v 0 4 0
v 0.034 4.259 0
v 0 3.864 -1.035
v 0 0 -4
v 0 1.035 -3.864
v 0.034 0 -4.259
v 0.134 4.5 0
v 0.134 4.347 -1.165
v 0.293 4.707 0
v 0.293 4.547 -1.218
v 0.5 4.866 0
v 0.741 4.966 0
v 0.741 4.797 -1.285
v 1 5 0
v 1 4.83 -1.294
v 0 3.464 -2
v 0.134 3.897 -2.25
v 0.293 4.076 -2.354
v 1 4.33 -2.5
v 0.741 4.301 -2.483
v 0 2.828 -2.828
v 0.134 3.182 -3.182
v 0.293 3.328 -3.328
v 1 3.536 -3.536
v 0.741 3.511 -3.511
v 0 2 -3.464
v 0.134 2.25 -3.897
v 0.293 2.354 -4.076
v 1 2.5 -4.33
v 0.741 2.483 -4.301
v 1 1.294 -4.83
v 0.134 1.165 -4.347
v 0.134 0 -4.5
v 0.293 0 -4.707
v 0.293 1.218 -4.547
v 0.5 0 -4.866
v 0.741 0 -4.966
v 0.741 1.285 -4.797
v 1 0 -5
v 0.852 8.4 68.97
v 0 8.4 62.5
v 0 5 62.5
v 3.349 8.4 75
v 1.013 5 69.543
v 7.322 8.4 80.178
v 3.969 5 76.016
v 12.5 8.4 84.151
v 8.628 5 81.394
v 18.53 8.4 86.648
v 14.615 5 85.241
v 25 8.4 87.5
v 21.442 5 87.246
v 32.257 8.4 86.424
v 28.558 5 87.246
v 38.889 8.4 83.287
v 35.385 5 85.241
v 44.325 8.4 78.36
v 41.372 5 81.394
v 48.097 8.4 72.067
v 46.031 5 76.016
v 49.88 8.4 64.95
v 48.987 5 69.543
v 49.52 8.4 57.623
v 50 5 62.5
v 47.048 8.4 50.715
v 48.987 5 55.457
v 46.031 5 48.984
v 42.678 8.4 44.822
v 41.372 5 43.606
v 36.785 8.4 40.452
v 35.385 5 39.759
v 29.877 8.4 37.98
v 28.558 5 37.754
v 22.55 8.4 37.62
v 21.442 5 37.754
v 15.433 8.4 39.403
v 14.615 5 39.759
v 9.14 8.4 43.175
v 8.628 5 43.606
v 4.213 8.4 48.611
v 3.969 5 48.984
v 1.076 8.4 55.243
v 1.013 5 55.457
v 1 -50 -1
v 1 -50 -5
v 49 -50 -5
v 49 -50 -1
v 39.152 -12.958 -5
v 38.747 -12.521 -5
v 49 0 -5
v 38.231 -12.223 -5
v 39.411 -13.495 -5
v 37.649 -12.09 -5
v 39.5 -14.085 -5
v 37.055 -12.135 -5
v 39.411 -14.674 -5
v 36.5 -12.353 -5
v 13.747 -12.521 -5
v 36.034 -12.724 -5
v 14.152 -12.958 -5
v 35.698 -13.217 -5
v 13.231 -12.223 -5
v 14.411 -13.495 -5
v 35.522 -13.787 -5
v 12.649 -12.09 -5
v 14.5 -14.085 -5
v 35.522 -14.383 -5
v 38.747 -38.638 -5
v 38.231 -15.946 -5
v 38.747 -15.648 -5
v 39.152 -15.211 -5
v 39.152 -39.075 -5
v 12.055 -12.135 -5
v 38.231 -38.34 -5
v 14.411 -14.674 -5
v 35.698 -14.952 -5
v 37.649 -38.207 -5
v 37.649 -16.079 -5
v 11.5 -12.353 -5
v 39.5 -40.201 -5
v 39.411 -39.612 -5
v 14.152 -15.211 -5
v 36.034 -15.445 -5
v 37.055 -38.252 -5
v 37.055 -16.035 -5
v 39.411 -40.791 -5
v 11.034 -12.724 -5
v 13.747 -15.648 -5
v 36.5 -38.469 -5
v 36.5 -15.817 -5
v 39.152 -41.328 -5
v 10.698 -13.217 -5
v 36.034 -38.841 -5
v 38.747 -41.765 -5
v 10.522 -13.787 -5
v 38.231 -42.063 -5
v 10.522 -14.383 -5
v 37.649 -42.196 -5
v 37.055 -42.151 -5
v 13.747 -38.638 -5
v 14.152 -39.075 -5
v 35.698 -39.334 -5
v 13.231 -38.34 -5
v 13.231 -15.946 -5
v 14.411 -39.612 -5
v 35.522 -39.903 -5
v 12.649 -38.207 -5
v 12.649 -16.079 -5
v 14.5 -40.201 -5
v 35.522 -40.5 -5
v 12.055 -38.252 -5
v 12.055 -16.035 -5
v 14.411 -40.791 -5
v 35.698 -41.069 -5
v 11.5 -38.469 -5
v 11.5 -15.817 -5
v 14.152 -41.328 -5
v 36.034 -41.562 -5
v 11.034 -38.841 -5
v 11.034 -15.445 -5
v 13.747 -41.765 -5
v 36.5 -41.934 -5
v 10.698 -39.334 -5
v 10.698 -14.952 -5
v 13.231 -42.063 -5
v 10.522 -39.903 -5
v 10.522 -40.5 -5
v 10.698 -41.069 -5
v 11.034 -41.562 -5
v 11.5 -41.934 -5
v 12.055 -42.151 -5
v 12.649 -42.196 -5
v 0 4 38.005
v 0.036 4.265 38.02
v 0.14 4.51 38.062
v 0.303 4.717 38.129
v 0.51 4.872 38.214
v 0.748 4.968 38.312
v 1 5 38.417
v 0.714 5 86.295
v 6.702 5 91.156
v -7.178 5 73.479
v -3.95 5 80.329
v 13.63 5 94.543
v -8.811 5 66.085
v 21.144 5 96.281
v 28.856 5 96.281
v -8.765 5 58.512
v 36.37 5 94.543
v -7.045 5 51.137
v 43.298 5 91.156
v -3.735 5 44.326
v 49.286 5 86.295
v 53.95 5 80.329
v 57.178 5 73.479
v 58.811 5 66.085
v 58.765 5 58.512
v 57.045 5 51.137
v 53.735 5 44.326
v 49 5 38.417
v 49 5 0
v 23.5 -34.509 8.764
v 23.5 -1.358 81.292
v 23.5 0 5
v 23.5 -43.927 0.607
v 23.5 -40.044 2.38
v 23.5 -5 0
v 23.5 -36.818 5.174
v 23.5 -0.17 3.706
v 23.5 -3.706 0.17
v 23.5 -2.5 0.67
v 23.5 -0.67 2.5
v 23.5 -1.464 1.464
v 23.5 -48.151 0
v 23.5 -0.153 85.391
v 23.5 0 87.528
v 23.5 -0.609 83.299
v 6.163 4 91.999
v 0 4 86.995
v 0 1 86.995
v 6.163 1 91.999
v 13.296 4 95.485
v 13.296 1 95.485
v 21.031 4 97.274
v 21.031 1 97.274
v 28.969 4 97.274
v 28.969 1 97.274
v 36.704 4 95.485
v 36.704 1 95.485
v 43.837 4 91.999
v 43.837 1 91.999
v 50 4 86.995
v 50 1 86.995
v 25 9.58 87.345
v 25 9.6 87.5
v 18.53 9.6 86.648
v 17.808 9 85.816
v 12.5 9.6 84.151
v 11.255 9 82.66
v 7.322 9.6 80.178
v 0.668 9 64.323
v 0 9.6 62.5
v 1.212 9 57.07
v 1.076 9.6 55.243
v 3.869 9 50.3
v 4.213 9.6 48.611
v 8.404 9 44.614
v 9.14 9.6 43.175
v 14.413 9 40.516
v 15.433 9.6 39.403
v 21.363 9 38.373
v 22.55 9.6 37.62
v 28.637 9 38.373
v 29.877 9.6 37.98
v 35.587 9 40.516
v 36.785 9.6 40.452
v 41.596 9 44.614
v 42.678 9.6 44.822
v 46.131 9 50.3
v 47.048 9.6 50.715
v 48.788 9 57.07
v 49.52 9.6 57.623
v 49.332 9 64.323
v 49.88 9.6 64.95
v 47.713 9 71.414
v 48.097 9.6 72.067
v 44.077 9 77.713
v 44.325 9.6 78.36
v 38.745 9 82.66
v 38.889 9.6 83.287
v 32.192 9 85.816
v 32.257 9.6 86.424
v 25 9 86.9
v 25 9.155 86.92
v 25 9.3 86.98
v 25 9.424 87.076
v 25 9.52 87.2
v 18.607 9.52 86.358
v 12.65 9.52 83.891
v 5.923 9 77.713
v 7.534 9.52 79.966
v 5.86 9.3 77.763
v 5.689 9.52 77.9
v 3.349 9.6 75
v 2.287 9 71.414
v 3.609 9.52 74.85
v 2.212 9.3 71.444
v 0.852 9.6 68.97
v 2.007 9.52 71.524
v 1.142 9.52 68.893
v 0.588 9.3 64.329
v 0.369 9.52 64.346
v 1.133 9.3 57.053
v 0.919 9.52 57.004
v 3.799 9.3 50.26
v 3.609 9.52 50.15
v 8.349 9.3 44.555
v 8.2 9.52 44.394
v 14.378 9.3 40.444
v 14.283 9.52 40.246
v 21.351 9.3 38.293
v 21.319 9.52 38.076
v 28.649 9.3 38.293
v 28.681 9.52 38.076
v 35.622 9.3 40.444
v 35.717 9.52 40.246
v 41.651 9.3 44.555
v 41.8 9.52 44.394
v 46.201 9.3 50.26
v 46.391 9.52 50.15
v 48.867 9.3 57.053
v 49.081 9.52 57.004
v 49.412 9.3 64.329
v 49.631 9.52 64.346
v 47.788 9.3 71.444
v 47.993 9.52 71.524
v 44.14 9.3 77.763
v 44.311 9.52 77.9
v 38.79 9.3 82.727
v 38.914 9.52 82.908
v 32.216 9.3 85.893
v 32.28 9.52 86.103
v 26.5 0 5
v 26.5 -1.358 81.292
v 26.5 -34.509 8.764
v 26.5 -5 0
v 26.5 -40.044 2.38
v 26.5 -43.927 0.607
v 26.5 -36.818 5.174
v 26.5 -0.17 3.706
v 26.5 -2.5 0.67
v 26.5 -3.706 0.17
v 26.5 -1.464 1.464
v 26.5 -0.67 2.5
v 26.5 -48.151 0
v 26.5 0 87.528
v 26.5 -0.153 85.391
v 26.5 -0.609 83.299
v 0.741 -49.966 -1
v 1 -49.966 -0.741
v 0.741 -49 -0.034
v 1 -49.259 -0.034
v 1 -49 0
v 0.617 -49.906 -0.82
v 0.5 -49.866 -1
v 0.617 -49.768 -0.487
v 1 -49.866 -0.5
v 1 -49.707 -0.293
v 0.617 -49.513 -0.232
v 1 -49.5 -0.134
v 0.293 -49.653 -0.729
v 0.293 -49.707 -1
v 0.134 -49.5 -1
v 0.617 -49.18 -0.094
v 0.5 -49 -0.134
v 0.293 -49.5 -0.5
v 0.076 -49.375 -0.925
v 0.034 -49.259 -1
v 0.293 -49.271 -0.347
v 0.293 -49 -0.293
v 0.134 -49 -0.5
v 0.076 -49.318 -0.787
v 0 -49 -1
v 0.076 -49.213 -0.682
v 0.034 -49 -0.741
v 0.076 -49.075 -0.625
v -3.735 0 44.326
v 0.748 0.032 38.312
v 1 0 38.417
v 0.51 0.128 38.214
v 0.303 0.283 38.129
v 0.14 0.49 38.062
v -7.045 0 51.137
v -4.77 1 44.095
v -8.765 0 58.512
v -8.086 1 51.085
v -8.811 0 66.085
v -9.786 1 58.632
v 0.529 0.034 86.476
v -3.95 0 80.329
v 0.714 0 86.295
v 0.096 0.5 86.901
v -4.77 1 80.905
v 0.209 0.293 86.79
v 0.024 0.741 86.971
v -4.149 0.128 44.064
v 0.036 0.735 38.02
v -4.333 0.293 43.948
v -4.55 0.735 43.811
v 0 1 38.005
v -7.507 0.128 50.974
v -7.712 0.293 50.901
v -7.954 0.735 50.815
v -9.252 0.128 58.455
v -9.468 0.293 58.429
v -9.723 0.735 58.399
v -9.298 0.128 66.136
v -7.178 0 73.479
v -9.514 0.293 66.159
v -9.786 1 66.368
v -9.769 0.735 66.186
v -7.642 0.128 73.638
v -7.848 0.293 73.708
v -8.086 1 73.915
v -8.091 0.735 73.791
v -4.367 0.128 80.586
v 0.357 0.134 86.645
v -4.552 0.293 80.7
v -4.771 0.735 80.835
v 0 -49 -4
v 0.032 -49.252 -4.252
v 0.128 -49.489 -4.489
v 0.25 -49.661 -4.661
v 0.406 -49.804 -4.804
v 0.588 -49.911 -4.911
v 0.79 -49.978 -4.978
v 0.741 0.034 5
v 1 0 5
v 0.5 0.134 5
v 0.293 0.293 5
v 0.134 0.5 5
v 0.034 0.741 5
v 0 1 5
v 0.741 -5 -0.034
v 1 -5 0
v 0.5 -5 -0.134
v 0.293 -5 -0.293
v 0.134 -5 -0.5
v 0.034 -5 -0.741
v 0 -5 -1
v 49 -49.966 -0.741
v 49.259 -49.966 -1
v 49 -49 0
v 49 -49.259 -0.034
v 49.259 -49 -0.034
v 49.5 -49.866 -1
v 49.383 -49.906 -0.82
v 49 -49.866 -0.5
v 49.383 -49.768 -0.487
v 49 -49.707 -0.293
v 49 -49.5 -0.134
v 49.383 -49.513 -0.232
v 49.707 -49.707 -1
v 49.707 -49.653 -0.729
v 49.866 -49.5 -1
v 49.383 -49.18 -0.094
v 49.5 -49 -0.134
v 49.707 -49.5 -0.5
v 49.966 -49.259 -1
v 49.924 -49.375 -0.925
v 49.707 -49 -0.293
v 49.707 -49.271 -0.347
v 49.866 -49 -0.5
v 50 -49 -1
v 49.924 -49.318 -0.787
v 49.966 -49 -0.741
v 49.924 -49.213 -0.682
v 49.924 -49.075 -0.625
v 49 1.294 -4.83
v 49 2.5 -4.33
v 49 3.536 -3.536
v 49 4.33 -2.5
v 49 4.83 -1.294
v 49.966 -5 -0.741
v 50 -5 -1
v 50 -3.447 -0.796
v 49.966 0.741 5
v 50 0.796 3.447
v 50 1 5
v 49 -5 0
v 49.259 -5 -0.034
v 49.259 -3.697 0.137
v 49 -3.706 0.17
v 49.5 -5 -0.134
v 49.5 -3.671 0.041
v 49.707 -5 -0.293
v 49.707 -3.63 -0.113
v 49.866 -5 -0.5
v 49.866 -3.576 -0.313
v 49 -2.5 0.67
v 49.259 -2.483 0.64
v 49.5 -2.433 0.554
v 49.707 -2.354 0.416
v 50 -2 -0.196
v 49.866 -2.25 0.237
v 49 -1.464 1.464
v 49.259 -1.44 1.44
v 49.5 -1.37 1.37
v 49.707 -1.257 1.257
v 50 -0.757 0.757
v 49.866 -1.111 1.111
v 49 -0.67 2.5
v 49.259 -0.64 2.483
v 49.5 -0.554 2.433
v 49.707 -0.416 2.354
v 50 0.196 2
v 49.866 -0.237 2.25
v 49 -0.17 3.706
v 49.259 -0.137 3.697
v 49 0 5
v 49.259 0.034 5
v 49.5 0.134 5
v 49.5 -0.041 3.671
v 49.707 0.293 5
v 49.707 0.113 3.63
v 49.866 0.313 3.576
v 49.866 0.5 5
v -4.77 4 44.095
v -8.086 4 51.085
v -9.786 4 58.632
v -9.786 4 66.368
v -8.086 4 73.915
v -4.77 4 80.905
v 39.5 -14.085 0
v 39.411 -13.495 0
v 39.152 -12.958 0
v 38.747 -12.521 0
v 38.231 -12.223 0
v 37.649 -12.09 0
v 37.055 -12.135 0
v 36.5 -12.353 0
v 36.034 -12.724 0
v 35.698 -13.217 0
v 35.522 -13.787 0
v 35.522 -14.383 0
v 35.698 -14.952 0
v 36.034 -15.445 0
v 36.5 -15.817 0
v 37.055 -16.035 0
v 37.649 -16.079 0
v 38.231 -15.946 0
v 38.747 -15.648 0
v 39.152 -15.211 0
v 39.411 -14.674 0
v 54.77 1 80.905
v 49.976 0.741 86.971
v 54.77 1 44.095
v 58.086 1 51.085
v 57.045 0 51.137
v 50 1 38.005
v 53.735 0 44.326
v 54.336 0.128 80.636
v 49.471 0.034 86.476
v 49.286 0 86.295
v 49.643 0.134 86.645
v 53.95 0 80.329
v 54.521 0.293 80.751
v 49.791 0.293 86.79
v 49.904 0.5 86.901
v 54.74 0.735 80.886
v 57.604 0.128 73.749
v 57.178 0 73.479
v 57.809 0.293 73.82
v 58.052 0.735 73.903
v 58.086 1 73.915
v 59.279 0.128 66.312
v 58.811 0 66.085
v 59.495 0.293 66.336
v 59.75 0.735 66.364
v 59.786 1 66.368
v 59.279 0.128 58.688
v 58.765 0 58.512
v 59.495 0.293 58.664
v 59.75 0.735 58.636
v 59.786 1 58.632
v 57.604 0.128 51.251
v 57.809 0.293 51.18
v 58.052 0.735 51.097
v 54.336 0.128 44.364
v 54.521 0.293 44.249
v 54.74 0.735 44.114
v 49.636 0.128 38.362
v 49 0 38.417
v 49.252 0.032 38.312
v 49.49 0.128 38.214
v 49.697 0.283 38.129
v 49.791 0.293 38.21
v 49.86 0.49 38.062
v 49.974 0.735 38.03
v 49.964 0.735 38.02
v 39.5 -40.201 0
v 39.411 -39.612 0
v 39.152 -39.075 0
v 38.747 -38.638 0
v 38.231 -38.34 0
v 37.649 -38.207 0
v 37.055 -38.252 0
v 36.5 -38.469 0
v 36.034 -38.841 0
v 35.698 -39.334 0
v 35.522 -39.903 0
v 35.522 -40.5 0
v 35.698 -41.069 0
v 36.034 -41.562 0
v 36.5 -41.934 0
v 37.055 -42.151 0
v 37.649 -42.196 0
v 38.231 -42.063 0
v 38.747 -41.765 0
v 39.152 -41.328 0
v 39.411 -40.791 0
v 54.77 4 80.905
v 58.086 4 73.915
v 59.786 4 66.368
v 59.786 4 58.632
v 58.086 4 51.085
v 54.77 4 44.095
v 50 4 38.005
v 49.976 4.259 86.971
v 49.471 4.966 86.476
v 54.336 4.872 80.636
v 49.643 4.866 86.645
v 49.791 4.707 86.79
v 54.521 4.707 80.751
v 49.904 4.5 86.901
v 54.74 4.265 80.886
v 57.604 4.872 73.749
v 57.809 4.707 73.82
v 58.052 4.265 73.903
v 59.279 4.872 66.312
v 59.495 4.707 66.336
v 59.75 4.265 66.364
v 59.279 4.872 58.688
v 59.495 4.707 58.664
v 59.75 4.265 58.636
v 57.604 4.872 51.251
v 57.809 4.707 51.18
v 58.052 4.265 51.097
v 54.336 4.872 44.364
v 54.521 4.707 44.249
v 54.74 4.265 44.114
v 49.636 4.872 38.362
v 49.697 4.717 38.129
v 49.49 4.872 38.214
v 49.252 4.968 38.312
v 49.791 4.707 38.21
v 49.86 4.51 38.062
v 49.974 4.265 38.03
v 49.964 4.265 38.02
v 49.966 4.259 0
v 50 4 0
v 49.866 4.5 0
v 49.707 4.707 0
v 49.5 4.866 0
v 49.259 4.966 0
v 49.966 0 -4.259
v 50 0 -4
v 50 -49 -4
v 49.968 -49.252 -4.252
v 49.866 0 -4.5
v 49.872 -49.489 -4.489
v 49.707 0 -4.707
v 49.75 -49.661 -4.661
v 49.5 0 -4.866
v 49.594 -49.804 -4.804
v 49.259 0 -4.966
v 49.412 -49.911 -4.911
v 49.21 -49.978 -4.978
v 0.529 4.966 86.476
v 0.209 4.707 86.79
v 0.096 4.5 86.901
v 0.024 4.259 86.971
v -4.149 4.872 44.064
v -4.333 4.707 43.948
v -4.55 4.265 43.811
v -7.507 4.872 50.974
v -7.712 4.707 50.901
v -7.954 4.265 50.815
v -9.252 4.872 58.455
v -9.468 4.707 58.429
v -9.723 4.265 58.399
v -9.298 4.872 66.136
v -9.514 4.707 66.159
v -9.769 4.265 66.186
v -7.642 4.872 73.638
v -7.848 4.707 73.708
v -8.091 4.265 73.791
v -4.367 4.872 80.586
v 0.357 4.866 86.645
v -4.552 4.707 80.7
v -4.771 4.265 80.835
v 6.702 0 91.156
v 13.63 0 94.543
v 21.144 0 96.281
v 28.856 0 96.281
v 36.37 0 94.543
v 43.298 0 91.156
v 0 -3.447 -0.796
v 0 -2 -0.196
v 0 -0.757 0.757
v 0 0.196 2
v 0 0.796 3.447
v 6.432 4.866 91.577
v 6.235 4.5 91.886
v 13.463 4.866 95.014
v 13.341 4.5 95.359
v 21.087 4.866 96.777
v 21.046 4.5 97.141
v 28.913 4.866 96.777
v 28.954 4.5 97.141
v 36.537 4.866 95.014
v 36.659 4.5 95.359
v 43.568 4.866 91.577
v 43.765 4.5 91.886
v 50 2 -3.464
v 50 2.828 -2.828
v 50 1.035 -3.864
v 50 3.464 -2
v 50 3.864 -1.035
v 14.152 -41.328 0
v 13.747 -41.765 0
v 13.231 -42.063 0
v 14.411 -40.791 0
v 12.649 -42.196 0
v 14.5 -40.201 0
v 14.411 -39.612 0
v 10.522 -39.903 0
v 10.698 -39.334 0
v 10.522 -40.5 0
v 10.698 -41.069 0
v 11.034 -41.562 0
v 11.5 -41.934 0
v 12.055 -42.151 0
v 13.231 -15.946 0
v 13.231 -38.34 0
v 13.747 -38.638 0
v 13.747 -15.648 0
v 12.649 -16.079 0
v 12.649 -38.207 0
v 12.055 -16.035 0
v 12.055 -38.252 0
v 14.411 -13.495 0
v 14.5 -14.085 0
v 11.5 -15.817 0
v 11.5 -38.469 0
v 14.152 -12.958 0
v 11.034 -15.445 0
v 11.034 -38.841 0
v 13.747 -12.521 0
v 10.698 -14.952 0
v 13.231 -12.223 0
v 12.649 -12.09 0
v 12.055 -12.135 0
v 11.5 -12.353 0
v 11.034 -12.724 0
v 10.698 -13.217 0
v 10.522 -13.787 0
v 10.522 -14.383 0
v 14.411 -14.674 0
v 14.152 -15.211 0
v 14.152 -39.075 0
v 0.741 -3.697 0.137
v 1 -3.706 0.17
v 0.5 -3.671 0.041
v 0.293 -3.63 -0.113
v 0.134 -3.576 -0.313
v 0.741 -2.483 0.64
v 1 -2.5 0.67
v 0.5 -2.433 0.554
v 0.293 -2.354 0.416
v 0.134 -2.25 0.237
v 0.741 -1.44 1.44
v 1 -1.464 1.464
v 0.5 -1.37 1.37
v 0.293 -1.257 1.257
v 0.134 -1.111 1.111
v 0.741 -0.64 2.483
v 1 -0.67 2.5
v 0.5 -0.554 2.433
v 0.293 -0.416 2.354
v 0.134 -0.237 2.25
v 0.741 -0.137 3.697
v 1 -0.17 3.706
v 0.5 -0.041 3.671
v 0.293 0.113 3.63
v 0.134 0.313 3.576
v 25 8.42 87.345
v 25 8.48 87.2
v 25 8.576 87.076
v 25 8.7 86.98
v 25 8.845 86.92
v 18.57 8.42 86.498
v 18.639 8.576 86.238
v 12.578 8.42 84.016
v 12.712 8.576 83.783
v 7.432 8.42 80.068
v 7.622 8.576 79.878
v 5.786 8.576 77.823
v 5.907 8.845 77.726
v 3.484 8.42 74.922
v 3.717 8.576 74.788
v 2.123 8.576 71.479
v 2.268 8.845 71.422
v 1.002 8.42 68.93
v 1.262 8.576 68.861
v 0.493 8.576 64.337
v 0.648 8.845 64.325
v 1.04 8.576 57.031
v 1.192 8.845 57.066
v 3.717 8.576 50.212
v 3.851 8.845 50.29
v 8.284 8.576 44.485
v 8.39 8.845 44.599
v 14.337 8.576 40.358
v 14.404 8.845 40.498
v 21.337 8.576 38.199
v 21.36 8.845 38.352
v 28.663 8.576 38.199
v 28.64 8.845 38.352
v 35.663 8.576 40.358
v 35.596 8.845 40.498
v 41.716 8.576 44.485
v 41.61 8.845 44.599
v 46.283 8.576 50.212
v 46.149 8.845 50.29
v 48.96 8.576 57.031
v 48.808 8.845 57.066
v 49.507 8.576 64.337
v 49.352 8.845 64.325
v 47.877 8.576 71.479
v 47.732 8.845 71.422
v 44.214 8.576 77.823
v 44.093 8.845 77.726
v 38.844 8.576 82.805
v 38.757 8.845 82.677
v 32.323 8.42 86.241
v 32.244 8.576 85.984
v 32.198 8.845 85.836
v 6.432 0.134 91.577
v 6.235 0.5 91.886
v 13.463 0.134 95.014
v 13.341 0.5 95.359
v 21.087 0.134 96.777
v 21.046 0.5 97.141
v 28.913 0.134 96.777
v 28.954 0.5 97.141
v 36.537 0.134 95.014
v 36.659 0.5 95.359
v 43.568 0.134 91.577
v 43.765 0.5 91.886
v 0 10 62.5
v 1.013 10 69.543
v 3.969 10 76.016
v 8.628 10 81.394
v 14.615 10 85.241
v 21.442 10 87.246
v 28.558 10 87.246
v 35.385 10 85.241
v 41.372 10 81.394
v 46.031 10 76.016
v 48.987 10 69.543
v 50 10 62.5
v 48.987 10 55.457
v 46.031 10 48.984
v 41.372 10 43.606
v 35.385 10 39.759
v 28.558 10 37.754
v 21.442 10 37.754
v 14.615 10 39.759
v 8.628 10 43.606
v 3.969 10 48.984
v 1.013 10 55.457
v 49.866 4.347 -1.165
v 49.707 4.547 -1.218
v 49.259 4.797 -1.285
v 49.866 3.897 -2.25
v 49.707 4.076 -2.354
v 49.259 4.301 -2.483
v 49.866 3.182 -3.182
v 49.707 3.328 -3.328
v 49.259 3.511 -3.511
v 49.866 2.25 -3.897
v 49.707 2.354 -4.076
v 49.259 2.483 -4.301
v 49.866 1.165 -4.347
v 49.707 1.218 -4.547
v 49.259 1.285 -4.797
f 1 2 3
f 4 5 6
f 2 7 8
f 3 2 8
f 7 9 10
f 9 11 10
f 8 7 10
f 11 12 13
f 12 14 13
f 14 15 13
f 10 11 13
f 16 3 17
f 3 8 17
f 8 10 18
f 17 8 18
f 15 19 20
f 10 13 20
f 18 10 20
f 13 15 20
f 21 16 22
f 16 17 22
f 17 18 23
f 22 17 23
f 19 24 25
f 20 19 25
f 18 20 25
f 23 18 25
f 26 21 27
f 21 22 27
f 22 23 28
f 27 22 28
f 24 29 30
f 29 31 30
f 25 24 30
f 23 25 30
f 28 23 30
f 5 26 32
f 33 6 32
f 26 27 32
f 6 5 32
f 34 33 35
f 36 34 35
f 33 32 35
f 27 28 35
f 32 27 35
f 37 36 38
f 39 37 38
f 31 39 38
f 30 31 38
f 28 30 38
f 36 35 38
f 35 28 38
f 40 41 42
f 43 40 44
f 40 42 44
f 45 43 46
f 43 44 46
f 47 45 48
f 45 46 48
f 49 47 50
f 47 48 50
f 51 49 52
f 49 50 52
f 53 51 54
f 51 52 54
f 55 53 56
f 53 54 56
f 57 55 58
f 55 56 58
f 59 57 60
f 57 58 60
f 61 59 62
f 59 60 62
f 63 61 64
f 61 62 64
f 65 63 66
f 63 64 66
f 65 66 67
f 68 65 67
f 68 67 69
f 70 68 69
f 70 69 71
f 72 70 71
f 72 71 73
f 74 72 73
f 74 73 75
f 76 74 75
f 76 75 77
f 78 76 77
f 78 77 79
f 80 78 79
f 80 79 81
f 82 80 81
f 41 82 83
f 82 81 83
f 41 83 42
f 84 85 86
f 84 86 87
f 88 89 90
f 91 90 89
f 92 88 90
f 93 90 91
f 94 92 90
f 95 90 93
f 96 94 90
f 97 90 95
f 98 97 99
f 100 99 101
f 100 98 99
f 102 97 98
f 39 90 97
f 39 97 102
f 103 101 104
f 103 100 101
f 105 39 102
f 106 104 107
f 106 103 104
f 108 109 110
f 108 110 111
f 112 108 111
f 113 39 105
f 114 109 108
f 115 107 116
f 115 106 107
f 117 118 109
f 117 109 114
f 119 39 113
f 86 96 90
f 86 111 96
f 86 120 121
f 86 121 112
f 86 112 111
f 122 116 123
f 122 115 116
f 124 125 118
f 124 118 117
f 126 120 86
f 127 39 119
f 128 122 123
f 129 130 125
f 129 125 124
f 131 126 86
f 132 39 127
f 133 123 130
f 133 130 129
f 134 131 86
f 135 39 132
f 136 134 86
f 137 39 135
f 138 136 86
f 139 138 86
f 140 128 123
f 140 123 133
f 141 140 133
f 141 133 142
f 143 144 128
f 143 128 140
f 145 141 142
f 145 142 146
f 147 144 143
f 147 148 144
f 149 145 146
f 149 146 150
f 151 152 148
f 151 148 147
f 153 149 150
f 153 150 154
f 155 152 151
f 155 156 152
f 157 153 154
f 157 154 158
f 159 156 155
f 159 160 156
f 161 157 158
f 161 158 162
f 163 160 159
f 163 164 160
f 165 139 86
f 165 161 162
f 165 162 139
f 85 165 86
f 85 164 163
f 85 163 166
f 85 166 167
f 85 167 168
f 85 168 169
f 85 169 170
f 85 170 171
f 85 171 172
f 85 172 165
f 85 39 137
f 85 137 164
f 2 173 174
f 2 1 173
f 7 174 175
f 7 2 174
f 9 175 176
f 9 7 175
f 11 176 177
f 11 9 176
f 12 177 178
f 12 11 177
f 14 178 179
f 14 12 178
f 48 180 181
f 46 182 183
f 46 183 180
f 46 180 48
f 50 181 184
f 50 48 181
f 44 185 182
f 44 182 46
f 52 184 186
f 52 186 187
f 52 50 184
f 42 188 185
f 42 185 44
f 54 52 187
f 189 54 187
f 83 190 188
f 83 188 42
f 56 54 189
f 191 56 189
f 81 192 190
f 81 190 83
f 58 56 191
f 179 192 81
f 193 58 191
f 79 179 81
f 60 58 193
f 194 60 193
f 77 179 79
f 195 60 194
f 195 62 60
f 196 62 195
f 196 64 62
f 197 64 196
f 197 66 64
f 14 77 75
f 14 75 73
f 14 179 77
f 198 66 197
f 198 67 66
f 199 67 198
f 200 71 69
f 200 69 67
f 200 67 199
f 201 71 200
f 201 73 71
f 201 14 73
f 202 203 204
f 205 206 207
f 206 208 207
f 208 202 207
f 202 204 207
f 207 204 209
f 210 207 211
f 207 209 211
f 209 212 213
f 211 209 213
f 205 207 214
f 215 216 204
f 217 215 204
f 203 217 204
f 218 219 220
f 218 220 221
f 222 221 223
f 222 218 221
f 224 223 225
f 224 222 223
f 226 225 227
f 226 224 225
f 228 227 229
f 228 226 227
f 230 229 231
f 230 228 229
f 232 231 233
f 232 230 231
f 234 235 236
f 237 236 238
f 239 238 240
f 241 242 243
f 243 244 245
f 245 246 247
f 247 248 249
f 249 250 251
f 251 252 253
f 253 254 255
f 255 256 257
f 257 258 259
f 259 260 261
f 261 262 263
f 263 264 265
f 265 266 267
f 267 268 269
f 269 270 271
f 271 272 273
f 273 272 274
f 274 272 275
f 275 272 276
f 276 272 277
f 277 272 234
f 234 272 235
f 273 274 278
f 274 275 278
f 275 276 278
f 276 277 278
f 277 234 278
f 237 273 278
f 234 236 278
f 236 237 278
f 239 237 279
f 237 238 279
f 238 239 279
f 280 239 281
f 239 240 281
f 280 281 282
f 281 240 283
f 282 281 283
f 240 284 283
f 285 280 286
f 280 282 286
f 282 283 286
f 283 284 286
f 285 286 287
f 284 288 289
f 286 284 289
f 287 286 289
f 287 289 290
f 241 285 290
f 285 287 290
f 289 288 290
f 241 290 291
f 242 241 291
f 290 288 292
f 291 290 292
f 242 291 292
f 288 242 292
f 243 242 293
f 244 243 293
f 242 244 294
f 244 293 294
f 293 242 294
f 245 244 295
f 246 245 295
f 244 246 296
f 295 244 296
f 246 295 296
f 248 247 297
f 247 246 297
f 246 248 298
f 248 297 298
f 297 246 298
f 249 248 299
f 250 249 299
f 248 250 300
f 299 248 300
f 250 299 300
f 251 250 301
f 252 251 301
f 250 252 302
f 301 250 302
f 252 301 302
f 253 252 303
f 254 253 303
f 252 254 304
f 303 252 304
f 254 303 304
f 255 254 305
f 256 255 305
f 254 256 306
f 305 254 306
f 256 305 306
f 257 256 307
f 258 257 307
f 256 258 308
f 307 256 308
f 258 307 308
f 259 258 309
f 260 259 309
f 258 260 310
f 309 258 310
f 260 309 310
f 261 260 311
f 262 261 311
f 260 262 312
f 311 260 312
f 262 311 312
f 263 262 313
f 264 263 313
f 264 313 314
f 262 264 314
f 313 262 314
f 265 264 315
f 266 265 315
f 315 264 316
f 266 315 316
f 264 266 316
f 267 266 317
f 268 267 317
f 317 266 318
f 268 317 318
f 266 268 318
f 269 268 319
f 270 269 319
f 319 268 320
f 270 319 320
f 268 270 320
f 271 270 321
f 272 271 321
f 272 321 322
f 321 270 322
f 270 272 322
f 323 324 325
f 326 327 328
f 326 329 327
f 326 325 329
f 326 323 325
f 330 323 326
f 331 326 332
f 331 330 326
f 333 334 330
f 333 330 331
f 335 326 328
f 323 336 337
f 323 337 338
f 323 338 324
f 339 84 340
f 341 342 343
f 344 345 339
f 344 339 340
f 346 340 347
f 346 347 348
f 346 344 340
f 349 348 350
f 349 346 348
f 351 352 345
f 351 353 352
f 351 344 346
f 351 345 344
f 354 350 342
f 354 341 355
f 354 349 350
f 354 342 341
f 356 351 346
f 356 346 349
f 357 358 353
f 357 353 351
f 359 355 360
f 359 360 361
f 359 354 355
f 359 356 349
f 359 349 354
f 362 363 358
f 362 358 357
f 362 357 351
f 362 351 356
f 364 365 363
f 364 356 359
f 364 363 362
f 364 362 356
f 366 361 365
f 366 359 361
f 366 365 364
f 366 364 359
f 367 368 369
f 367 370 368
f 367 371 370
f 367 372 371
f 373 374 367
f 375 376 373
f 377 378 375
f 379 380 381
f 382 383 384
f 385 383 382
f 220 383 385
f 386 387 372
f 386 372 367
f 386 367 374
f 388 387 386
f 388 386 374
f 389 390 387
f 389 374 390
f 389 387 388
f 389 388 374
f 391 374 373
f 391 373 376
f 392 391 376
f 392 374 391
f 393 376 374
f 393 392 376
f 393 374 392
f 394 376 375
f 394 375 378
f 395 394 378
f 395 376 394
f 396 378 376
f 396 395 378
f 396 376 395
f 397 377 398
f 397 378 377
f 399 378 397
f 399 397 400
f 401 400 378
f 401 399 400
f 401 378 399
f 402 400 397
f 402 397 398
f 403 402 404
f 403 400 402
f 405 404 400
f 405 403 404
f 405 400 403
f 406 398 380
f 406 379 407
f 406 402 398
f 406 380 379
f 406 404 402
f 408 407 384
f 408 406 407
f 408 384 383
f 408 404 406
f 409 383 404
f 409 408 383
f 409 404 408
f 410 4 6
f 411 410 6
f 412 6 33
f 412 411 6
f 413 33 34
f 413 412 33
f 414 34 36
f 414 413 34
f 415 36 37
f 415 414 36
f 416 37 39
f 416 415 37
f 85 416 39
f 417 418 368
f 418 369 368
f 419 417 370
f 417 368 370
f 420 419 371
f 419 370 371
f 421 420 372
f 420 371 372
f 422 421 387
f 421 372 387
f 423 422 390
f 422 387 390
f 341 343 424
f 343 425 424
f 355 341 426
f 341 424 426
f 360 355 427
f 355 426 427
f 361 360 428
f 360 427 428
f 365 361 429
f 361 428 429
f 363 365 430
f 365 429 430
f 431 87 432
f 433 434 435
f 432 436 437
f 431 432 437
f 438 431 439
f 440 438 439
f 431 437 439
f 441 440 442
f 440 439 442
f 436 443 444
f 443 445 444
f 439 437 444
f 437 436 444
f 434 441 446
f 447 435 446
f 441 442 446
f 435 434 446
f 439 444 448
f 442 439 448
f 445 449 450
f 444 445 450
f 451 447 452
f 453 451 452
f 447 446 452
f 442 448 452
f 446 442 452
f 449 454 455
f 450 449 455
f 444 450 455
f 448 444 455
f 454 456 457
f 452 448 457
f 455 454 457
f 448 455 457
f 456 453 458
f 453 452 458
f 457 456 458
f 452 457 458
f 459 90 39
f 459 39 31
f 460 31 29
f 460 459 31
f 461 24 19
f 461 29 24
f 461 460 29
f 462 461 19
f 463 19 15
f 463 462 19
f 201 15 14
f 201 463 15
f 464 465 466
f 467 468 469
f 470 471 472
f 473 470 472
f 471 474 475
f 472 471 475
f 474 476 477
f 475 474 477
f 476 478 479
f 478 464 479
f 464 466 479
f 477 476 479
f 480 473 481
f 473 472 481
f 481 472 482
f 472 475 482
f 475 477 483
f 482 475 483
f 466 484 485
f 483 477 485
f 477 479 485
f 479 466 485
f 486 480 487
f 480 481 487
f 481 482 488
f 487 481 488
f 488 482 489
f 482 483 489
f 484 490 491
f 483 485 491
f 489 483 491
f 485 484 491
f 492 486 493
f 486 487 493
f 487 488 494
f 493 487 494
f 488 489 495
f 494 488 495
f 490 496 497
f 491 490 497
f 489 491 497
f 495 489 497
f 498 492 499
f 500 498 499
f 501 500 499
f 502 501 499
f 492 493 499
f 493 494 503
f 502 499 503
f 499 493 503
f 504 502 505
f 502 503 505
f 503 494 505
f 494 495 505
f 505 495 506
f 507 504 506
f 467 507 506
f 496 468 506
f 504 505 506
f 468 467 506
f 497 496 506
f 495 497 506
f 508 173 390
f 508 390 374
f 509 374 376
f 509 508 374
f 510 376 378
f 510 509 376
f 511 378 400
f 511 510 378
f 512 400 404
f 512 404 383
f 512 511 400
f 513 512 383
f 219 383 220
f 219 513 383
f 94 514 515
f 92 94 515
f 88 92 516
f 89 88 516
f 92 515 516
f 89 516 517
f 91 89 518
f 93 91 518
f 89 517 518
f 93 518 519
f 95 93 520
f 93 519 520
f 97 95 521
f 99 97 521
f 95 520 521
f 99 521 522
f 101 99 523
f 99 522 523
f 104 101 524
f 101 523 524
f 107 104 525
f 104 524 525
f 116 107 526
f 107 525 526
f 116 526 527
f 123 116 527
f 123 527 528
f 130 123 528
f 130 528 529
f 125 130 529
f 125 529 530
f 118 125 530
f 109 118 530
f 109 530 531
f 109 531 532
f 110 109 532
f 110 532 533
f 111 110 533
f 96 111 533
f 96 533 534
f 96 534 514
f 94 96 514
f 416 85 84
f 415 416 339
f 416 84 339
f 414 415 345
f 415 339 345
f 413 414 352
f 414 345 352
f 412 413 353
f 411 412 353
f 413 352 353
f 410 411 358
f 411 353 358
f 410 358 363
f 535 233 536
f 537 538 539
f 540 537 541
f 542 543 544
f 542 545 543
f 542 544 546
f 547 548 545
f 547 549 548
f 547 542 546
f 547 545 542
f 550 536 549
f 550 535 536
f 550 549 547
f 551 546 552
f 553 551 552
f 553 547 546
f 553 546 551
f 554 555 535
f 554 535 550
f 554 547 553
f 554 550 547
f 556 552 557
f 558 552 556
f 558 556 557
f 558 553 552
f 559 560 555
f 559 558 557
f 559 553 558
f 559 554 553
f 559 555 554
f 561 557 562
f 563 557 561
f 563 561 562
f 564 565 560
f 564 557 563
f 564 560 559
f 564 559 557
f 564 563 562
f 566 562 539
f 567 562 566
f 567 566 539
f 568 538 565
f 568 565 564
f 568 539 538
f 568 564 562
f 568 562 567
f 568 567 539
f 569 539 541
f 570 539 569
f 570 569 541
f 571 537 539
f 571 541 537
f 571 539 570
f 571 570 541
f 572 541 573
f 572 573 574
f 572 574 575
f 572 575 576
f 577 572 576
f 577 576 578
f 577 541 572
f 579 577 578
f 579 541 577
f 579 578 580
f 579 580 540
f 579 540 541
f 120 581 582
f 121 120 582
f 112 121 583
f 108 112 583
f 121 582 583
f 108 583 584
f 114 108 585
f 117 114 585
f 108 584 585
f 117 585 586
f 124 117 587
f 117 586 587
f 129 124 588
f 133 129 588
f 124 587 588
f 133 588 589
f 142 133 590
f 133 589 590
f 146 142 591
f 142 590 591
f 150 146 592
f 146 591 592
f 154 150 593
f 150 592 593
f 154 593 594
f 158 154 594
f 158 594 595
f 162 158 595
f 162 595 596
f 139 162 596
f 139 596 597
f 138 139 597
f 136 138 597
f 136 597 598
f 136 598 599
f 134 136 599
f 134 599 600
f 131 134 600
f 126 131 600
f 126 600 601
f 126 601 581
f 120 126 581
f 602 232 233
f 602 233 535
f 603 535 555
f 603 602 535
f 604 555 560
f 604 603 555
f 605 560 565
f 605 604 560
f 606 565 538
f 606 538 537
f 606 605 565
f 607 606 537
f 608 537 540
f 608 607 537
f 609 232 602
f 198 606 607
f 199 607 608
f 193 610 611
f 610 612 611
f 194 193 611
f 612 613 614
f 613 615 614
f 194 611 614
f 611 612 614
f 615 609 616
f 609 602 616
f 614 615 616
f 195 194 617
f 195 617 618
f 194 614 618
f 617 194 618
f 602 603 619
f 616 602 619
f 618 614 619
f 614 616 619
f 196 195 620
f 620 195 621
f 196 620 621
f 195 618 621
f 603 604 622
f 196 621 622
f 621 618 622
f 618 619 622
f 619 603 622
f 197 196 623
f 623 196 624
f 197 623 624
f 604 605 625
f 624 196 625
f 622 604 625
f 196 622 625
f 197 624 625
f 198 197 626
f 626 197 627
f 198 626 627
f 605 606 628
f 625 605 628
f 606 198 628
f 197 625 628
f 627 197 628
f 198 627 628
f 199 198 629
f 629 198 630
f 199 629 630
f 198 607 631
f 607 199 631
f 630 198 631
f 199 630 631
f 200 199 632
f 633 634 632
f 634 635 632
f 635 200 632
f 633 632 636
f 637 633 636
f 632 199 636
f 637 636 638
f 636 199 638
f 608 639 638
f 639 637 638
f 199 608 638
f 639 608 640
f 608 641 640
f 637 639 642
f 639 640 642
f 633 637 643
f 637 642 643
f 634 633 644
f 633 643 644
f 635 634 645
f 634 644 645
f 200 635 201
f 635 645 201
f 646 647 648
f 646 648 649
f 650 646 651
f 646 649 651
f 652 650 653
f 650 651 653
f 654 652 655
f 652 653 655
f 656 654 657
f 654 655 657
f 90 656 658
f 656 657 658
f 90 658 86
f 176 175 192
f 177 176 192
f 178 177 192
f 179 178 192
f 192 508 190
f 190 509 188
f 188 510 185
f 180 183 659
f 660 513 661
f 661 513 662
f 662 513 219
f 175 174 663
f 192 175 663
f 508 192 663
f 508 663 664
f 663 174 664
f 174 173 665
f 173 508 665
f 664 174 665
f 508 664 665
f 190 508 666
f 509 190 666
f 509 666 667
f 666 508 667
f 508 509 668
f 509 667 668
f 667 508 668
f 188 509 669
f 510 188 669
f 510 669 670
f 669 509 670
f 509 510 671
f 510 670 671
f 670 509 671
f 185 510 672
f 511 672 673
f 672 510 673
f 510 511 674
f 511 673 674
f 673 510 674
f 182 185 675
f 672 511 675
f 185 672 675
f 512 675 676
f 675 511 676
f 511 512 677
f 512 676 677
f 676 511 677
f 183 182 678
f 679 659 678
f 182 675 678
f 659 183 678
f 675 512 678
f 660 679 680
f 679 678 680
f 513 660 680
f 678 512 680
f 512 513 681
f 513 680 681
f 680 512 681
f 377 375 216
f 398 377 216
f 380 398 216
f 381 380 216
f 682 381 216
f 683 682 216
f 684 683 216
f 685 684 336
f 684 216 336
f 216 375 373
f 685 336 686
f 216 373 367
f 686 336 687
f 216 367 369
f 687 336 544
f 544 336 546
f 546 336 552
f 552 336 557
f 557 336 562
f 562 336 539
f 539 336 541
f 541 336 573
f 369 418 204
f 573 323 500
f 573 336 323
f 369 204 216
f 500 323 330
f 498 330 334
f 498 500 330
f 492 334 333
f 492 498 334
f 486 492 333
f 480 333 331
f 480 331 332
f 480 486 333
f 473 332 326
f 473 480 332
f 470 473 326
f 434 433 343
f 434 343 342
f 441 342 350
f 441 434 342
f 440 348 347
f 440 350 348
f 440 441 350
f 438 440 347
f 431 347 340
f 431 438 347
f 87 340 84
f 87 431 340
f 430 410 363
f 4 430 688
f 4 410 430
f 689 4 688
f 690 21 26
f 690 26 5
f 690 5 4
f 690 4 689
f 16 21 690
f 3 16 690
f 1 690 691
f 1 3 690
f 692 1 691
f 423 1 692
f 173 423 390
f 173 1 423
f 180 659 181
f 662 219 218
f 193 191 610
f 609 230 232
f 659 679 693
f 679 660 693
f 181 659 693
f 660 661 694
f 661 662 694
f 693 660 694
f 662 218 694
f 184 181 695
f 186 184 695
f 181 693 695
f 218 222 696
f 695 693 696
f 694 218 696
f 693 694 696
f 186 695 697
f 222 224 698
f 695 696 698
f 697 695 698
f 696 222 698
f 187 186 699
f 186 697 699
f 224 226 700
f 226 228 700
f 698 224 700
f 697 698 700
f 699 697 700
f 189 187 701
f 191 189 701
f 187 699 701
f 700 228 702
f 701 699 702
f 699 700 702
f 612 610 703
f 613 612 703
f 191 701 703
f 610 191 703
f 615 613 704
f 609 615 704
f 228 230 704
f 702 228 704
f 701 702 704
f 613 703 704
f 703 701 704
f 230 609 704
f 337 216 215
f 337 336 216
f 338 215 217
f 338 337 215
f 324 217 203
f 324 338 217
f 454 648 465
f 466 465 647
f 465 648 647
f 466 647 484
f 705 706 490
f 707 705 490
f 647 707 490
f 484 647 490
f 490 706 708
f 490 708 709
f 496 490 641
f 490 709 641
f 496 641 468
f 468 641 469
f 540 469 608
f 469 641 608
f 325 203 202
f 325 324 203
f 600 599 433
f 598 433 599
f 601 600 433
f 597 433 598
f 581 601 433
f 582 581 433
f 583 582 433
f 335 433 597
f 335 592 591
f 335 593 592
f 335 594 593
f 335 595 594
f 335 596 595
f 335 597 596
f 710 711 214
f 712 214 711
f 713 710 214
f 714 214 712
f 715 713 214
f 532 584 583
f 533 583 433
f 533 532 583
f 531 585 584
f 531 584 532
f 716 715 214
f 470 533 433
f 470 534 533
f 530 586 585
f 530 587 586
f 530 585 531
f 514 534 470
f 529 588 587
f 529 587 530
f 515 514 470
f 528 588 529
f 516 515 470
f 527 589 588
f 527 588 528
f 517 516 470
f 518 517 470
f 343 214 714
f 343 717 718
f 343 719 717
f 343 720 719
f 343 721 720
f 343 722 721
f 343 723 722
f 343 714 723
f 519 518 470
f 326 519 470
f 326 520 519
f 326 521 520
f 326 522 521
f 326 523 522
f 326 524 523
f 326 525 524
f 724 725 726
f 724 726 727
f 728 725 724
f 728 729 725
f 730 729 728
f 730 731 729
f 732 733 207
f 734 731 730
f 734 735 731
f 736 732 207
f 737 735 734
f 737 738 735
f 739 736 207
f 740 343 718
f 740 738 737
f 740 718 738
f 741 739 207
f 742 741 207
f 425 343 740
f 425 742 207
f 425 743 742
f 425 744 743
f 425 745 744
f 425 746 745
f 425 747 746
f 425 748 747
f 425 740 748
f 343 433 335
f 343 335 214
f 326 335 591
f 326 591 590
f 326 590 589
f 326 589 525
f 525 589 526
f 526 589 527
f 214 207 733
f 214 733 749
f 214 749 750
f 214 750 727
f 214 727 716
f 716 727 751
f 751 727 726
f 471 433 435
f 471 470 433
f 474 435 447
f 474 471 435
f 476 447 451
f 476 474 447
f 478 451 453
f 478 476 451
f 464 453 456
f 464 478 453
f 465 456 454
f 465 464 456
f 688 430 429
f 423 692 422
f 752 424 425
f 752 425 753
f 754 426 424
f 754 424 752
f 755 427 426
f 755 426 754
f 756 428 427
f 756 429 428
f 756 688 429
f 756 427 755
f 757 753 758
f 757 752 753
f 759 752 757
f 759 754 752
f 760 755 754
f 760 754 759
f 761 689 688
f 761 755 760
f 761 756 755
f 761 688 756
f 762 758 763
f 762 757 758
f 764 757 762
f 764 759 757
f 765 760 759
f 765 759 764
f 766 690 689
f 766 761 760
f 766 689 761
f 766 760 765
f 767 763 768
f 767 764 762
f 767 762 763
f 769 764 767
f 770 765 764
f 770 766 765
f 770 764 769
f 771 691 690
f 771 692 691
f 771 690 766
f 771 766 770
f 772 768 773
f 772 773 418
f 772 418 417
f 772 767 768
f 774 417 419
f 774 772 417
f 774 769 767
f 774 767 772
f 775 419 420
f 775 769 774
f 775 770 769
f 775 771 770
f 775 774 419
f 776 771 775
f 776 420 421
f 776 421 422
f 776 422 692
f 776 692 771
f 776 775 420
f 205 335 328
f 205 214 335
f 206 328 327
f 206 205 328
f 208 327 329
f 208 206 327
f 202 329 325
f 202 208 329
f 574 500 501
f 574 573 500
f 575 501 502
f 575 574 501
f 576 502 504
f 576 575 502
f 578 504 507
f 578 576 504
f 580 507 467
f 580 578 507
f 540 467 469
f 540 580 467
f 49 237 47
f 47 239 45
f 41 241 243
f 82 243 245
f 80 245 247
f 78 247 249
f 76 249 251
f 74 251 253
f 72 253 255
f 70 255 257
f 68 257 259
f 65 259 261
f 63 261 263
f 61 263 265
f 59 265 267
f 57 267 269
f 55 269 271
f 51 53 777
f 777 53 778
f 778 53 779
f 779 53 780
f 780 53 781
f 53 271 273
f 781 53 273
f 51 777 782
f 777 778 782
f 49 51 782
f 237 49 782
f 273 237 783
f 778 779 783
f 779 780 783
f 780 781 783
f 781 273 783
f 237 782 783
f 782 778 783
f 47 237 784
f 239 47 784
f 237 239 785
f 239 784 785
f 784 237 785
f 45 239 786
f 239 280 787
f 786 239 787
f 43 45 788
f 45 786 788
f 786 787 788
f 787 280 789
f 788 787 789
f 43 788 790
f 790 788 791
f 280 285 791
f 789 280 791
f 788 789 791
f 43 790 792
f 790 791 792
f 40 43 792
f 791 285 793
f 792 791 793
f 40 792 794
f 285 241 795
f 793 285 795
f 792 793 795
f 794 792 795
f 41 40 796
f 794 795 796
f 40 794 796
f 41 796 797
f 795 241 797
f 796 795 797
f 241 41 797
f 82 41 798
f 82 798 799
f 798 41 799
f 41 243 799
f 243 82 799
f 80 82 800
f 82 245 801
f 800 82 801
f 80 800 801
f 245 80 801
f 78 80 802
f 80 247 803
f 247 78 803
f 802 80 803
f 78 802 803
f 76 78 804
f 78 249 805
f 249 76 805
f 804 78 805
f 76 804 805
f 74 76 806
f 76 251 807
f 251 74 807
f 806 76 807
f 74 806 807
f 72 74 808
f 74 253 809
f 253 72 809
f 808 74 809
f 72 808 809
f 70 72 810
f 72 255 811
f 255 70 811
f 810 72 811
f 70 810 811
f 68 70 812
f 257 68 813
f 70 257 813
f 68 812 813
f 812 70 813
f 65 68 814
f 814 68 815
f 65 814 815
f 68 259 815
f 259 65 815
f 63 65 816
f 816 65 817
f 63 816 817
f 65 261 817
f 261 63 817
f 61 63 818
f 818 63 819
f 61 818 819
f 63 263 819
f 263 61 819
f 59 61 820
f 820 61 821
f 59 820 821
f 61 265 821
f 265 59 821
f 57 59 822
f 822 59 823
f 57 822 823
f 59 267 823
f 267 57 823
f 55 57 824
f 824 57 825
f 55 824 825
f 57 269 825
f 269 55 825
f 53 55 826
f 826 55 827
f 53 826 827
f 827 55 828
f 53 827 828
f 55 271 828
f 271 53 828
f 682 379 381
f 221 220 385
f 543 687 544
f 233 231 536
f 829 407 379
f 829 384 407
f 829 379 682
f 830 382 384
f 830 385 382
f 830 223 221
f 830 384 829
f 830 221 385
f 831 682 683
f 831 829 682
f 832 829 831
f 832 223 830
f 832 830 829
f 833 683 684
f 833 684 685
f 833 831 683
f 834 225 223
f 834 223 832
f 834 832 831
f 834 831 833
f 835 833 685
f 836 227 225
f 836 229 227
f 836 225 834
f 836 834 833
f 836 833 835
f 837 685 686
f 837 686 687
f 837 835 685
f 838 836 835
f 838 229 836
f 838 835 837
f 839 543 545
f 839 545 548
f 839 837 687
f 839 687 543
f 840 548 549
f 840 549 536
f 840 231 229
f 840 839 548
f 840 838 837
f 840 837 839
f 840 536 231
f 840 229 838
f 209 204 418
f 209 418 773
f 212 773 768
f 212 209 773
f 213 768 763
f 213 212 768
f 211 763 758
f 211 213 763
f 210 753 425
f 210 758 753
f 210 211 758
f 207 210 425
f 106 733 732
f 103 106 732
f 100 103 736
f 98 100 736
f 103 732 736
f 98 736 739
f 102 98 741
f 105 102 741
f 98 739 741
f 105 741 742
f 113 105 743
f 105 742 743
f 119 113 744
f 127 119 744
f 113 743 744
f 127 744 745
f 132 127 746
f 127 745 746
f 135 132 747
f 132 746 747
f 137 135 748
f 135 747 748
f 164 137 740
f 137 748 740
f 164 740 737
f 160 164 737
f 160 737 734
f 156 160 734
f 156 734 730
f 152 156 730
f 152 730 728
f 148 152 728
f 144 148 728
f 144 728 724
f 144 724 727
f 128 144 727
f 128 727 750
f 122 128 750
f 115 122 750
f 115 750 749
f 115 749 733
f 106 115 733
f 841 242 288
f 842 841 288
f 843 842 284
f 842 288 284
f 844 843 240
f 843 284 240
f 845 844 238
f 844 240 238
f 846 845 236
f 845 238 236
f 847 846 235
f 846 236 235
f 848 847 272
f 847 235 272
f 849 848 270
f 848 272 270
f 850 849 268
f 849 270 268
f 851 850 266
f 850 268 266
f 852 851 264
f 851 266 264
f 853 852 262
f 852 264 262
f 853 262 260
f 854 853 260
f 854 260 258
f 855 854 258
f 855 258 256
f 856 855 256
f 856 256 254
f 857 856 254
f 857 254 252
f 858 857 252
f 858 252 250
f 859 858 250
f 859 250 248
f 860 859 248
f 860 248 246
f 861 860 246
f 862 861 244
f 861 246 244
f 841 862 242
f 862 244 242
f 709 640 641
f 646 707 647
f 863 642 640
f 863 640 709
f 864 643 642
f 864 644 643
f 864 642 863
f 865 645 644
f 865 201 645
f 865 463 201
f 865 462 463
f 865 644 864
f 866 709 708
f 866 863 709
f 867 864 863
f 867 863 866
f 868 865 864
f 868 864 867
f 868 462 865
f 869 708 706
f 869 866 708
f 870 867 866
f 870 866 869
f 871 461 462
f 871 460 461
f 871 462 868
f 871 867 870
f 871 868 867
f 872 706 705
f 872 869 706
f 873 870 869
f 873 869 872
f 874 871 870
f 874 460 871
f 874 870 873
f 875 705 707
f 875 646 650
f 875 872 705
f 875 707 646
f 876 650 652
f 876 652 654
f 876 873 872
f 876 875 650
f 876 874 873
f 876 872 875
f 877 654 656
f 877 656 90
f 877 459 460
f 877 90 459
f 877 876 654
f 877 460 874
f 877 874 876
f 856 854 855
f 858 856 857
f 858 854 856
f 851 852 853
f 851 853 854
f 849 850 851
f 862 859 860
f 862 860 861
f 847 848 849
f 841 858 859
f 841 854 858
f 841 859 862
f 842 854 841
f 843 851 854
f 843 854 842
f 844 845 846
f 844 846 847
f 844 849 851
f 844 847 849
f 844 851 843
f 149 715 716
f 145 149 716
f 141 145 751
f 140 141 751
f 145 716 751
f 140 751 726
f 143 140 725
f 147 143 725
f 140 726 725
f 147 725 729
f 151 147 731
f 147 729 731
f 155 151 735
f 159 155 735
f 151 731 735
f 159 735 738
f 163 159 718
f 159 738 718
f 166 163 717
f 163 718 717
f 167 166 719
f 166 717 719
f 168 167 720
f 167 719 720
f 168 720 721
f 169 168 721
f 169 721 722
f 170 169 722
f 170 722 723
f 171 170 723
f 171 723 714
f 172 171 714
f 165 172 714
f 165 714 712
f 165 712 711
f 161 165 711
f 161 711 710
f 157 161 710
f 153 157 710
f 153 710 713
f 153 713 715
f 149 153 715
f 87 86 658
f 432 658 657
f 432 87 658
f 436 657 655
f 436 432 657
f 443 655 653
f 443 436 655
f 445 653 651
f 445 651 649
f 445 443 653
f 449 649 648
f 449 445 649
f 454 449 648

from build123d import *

# Parameters (mm, degrees)
BOSS_EXTRUDE1_DEPTH = 50
SKETCH2_R           = 25
BOSS_EXTRUDE2_DEPTH = 5
SKETCH3_R           = 35
BOSS_EXTRUDE3_DEPTH = 5
CUT_EXTRUDE1_DEPTH  = 154.378616502
BOSS_EXTRUDE5_DEPTH = 1.5
SKETCH8_R           = 2
CUT_EXTRUDE2_DEPTH  = 125.924977486
FILLET1_R           = 5
FILLET2_R           = 5
SKETCH4_R           = 0.6
FILLET3_R           = 15
FILLET4_R           = 15
FILLET5_R           = 1
FILLET6_R           = 1


with BuildPart() as part:
    # Sketch1 → Boss-Extrude1 (new body)
    with BuildSketch(Plane(origin=(0, 0, 0), x_dir=(0, 0, -1), z_dir=(1, 0, 0))):
        Polygon((0, 0), (-130, 0), (-130, 5), (5, 5), (5, -50), (0, -50), align=None)
    extrude(amount=BOSS_EXTRUDE1_DEPTH)

    # Sketch2 → Boss-Extrude2 (add)
    with BuildSketch(Plane(origin=(0, 5, 0), x_dir=(1, 0, 0), z_dir=(0, 1, 0))):
        with Locations(Location((25, -62.5, 0), (0, 0, 180))):
            Circle(SKETCH2_R)
    extrude(amount=BOSS_EXTRUDE2_DEPTH)

    # Sketch3 → Boss-Extrude3 (add)
    with BuildSketch(Plane(origin=(0, 5, 0), x_dir=(1, 0, 0), z_dir=(0, 1, 0))):
        with Locations((25, -62.5)):
            Circle(SKETCH3_R)
    extrude(amount=-BOSS_EXTRUDE3_DEPTH)

    # Sketch5 → Cut-Extrude1 (cut, through all)
    with BuildSketch(Plane(origin=(0, 5, 0), x_dir=(1, 0, 0), z_dir=(0, 1, 0))):
        with BuildLine():
            Line((50, -86.994897428), (70.537022891, -86.994897428))
            Line((70.537022891, -86.994897428), (70.537022891, -135.576876808))
            Line((70.537022891, -135.576876808), (-17.356127909, -135.576876808))
            Line((-17.356127909, -135.576876808), (0, -86.994897428))
            ThreePointArc((0, -86.994897428), (25, -97.5), (50, -86.994897428))
        make_face()
    extrude(amount=-CUT_EXTRUDE1_DEPTH, mode=Mode.SUBTRACT)

    # Sketch7 → Boss-Extrude5 (add, symmetric)
    with BuildSketch(Plane(origin=(25, 0, 0), x_dir=(0, 0, -1), z_dir=(1, 0, 0))):
        Polygon((0, 0), (-84.262202347, 0), (0, -38.514987448), align=None)
    extrude(amount=BOSS_EXTRUDE5_DEPTH, both=True)

    # Sketch8 → Cut-Extrude2 (cut, through all)
    with BuildSketch(Plane.XY):
        with Locations((12.5, -40.20147339)):
            Circle(SKETCH8_R)
        with Locations((12.5, -14.084651438)):
            Circle(SKETCH8_R)
        with Locations((37.5, -40.20147339)):
            Circle(SKETCH8_R)
        with Locations((37.5, -14.084651438)):
            Circle(SKETCH8_R)
    extrude(amount=-CUT_EXTRUDE2_DEPTH, mode=Mode.SUBTRACT)

    # Fillet1
    fillet1_edges = [part.edges().sort_by_distance(p)[0] for p in [
        (38.25, 0, 0),
        (11.75, 0, 0),
    ]]
    fillet(fillet1_edges, radius=FILLET1_R)

    # Fillet2
    fillet2_edges = [part.edges().sort_by_distance(p)[0] for p in [
        (25, 5, -5),
    ]]
    fillet(fillet2_edges, radius=FILLET2_R)

    # Sketch4 → Cut-Revolve1 (revolve, cut)
    with BuildSketch(Plane(origin=(25, 0, 0), x_dir=(0, 0, -1), z_dir=(1, 0, 0))):
        with Locations((-87.5, 9)):
            Circle(SKETCH4_R)
    revolve(axis=Axis((25, 10, 62.5), (0, -1, 0)), mode=Mode.SUBTRACT)

    # Fillet3
    fillet3_edges = [part.edges().sort_by_distance(p)[0] for p in [
        (25, -38.514987448, 0),
    ]]
    fillet(fillet3_edges, radius=FILLET3_R)

    # Fillet4
    fillet4_edges = [part.edges().sort_by_distance(p)[0] for p in [
        (25, 0, 84.262202347),
    ]]
    fillet(fillet4_edges, radius=FILLET4_R)

    # Fillet5
    fillet5_edges = [part.edges().sort_by_distance(p)[0] for p in [
        (25, -50, 0),
    ]]
    fillet(fillet5_edges, radius=FILLET5_R)

    # Fillet6
    fillet6_edges = [part.edges().sort_by_distance(p)[0] for p in [
        (0, -27, 0),
        (50, -27, 0),
        (0, -1.464466094, 1.464466094),
        (50, -1.464466094, 1.464466094),
        (50, 5, 19.002551286),
        (0, 5, 19.002551286),
        (0, 3.535533906, -3.535533906),
        (50, 3.535533906, -3.535533906),
        (50, -25, -5),
        (0, -50, -3),
        (50, -50, -3),
        (0, -49.707106781, -0.292893219),
        (50, -49.707106781, -0.292893219),
        (0, 0, 21.502551286),
        (50, 0, 21.502551286),
        (25, 0, 97.5),
        (25, 5, 97.5),
        (0, -25, -5),
    ]]
    fillet(fillet6_edges, radius=FILLET6_R)


solid = part.part
